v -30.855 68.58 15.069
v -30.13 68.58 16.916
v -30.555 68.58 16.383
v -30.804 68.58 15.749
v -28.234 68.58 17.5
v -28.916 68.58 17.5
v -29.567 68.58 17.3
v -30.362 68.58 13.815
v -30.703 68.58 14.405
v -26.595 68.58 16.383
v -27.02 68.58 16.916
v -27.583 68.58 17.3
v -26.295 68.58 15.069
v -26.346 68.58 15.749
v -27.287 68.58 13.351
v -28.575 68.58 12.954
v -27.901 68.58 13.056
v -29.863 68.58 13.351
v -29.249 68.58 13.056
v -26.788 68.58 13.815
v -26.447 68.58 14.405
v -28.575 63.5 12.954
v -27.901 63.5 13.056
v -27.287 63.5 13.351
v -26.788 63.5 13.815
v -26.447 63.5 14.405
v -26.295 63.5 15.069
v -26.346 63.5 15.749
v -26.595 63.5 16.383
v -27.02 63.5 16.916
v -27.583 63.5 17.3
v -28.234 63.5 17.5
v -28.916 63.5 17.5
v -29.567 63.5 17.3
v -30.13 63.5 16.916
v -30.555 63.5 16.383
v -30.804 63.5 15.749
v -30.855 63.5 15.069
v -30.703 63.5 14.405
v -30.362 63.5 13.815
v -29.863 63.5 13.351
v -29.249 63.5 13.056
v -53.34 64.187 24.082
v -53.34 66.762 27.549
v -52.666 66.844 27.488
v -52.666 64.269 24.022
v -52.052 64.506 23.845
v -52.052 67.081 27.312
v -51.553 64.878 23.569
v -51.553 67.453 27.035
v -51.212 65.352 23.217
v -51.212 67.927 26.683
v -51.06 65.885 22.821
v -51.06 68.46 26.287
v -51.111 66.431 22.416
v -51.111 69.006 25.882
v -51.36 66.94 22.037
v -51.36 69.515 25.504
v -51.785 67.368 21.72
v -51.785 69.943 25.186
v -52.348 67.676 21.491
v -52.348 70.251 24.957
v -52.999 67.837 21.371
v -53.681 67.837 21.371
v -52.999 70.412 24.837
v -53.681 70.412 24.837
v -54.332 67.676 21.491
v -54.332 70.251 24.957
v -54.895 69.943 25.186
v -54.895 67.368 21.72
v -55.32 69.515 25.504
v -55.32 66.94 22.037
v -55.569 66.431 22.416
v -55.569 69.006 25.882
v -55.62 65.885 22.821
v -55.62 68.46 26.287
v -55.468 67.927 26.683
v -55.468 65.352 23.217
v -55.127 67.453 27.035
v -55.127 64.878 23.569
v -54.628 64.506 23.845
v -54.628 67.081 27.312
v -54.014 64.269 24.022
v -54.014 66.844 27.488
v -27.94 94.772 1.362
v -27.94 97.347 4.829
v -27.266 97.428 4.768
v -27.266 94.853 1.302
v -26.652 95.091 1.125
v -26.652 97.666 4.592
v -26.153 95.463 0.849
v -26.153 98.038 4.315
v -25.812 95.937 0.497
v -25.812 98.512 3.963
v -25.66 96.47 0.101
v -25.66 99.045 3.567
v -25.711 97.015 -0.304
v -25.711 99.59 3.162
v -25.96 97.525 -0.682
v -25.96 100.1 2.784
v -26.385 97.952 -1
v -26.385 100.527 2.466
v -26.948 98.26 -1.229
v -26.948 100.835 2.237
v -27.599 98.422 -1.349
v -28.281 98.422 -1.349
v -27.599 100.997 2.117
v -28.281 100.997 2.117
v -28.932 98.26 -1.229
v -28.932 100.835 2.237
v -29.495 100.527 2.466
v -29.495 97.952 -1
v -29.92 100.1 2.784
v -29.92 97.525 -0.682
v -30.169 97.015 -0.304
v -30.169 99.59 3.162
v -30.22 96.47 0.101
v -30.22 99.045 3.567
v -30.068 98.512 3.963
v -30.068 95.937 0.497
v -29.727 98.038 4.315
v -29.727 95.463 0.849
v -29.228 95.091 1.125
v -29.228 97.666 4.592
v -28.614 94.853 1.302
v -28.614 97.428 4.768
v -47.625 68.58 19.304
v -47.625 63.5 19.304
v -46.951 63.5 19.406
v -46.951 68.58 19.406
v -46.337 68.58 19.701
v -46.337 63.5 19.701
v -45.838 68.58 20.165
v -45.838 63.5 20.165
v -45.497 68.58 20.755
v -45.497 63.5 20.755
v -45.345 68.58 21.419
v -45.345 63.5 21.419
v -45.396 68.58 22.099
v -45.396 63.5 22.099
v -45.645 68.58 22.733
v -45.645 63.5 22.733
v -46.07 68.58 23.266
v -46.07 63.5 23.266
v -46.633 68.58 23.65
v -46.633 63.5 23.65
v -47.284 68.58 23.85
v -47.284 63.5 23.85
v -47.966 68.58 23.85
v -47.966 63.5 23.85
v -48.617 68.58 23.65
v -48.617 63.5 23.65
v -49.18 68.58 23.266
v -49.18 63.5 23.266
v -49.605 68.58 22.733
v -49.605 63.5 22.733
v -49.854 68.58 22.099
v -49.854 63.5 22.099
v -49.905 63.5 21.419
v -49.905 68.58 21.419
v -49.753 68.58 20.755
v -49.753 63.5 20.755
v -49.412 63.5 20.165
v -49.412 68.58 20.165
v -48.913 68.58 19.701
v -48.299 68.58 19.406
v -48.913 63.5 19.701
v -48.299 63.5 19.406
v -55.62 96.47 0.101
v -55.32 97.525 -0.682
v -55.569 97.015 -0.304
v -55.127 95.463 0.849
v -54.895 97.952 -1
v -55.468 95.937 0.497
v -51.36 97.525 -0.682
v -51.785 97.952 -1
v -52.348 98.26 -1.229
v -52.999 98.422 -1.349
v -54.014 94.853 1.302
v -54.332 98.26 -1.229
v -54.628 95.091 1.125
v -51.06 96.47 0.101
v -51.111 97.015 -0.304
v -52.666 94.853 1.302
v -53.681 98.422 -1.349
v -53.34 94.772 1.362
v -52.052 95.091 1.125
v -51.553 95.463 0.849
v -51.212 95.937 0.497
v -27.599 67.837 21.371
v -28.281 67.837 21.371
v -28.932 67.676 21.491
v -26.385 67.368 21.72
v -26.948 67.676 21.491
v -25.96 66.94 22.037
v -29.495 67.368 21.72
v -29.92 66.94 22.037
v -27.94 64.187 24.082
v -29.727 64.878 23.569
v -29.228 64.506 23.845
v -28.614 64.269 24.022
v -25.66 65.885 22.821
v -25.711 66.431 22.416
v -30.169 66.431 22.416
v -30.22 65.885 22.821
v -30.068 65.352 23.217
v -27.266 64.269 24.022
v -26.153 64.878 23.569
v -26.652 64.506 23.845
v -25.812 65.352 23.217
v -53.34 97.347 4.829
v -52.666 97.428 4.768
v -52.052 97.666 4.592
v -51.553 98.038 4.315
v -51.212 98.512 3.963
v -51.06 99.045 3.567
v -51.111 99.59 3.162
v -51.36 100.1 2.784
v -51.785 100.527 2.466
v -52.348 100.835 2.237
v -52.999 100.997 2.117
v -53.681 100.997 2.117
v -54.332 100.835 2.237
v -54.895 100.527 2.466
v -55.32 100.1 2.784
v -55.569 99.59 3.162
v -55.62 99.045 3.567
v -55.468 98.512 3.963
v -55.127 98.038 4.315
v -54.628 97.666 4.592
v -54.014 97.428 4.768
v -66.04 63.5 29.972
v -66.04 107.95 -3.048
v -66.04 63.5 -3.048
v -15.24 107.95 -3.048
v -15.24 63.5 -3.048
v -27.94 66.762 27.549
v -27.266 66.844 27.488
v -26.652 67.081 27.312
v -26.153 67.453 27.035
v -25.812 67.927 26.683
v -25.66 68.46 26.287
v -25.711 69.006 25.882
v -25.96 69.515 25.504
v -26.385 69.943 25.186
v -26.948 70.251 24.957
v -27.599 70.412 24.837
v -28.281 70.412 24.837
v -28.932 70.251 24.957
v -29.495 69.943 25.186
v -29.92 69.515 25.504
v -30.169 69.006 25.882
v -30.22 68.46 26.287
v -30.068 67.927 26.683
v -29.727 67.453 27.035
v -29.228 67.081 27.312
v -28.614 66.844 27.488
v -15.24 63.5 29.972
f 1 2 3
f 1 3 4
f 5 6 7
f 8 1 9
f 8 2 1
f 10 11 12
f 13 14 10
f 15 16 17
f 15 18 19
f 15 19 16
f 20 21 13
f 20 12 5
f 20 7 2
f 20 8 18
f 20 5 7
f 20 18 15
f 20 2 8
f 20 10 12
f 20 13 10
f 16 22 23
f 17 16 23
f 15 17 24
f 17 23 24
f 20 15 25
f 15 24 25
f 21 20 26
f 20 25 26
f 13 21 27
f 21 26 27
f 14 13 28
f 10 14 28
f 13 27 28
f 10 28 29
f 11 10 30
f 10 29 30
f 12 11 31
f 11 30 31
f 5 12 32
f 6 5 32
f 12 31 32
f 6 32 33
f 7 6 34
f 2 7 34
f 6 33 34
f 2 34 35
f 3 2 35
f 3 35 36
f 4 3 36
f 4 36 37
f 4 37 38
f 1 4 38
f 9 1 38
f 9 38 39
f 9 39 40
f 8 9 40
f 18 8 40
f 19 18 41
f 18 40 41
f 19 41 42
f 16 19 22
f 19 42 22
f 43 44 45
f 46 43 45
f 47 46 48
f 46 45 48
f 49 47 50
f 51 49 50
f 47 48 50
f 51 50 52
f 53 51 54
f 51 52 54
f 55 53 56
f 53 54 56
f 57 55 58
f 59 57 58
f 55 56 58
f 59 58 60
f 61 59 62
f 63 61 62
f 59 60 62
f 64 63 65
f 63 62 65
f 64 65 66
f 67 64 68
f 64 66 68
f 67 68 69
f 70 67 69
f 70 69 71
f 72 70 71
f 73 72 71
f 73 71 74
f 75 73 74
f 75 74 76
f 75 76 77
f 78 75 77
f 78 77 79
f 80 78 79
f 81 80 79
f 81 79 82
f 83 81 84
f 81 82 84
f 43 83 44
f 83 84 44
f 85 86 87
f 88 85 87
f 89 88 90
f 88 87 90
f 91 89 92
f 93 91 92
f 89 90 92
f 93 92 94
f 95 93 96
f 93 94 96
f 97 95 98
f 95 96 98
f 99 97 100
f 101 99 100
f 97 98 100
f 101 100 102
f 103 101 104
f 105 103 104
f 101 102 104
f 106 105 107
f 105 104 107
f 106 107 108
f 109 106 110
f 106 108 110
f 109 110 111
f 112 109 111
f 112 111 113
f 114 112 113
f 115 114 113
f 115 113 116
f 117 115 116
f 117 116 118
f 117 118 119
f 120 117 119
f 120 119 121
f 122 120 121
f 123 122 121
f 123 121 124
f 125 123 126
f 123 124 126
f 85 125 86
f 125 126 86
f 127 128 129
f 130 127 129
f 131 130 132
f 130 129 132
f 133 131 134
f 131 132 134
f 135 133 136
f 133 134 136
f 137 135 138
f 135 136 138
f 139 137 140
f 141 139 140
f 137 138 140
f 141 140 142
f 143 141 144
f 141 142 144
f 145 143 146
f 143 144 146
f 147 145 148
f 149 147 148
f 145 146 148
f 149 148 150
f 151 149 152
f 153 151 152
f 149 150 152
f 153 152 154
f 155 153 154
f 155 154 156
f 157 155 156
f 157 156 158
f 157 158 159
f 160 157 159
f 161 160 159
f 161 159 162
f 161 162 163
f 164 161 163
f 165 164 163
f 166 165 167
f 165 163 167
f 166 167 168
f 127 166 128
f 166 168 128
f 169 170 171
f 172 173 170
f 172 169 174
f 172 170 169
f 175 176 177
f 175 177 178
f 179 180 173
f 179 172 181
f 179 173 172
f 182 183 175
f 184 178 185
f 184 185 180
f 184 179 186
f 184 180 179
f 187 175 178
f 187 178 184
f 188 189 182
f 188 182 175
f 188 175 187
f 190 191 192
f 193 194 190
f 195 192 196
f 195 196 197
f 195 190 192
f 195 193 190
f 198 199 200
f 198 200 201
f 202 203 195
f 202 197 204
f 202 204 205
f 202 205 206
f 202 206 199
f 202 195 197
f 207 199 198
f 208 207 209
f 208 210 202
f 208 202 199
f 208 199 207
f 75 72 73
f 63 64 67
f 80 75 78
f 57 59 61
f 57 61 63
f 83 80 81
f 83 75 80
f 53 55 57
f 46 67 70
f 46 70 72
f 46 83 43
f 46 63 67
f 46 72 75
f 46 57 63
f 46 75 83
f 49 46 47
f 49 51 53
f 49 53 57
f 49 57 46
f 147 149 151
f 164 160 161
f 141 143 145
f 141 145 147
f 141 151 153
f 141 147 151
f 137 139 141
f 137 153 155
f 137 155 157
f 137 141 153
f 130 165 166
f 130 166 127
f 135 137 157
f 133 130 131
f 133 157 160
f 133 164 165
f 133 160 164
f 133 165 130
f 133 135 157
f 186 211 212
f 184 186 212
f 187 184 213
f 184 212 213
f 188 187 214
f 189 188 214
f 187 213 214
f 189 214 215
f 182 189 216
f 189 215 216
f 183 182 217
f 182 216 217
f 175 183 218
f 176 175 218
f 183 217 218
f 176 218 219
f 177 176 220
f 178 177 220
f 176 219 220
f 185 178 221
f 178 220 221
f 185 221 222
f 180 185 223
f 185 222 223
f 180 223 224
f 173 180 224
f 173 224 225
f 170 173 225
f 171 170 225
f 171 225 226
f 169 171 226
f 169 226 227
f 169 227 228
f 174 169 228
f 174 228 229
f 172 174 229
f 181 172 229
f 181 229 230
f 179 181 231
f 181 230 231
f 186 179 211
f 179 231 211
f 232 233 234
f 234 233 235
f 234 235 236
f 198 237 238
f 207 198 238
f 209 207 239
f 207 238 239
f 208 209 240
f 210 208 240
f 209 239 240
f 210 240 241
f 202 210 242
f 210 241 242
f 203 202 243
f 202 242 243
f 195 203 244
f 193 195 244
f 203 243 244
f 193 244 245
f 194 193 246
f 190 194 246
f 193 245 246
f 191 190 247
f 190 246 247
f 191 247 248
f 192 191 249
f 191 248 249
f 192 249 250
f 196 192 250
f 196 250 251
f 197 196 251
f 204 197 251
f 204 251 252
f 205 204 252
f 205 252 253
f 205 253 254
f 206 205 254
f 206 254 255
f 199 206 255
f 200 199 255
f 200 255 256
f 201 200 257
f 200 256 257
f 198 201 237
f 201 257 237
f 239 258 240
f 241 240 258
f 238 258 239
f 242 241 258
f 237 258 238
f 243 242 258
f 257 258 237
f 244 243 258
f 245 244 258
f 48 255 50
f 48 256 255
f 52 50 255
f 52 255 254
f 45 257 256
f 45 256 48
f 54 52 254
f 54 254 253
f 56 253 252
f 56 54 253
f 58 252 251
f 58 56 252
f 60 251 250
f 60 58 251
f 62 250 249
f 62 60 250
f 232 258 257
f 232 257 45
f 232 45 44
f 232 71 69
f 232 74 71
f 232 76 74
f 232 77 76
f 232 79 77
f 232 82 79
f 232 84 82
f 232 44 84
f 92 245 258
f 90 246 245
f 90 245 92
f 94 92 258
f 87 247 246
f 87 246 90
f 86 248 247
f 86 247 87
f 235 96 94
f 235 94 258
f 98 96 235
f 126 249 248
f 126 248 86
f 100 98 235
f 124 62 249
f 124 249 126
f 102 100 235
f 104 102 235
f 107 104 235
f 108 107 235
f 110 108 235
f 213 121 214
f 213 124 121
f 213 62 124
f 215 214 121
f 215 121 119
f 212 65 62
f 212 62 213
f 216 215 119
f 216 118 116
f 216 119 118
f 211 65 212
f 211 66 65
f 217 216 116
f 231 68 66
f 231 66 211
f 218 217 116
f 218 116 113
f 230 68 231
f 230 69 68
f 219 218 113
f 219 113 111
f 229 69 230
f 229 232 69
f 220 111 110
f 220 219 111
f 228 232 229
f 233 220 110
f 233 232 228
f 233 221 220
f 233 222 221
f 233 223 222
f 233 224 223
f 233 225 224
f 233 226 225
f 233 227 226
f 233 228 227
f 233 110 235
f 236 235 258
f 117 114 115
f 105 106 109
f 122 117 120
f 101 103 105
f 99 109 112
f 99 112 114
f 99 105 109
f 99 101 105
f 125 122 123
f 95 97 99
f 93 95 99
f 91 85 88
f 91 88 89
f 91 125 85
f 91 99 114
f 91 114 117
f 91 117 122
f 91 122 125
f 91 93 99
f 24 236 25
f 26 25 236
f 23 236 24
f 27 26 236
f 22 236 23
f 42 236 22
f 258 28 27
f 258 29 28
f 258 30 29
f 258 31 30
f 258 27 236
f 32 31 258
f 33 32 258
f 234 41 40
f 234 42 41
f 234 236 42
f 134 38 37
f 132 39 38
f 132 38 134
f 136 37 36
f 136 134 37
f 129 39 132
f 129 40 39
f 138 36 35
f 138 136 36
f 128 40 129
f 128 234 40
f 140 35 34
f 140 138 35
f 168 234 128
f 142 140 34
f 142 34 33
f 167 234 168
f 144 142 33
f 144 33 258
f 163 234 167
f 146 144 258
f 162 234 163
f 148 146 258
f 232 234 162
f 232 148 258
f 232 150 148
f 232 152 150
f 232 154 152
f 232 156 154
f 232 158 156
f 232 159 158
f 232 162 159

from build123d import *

# Parameters (mm, degrees)
PAD031_DEPTH    = 50.8
SKETCH066_R     = 2.286
POCKET030_DEPTH = 5.08
SKETCH070_R     = 2.286
POCKET033_DEPTH = 4.318


with BuildPart() as part:
    # Sketch065 → Pad031 (new body)
    with BuildSketch(Plane.YZ):
        Polygon((0, 0), (0, 33.02), (44.45, 0), align=None)
    extrude(amount=PAD031_DEPTH)

    # Sketch066 (on Face1 of Pad031) → Pocket030 (cut)
    with BuildSketch(Plane(origin=(0, 0, 0), x_dir=(0, 0, -1), z_dir=(0, -1, 0))):
        with Locations((-24.638, 18.415)):
            Circle(SKETCH066_R)
        with Locations((-18.288, 37.465)):
            Circle(SKETCH066_R)
    extrude(amount=-POCKET030_DEPTH, mode=Mode.SUBTRACT)

    # Sketch070 (on Face5 of Pocket030) → Pocket033 (cut)
    with BuildSketch(Plane(origin=(0, 15.8065228827, 21.2780115729), x_dir=(0, -0.802743848, 0.5963240013), z_dir=(0, 0.5963240013, 0.802743848))):
        with Locations((-24.7593814758, 38.1)):
            Circle(SKETCH070_R)
        with Locations((13.3406185242, 38.1)):
            Circle(SKETCH070_R)
        with Locations((13.3406185242, 12.7)):
            Circle(SKETCH070_R)
        with Locations((-24.7593814758, 12.7)):
            Circle(SKETCH070_R)
    extrude(amount=-POCKET033_DEPTH, mode=Mode.SUBTRACT)


with BuildPart() as part_1:
    # Body023 placement: moved
    add(part.part.moved(Location((-66.04, 63.5, -3.048))))


solid = part_1.part
